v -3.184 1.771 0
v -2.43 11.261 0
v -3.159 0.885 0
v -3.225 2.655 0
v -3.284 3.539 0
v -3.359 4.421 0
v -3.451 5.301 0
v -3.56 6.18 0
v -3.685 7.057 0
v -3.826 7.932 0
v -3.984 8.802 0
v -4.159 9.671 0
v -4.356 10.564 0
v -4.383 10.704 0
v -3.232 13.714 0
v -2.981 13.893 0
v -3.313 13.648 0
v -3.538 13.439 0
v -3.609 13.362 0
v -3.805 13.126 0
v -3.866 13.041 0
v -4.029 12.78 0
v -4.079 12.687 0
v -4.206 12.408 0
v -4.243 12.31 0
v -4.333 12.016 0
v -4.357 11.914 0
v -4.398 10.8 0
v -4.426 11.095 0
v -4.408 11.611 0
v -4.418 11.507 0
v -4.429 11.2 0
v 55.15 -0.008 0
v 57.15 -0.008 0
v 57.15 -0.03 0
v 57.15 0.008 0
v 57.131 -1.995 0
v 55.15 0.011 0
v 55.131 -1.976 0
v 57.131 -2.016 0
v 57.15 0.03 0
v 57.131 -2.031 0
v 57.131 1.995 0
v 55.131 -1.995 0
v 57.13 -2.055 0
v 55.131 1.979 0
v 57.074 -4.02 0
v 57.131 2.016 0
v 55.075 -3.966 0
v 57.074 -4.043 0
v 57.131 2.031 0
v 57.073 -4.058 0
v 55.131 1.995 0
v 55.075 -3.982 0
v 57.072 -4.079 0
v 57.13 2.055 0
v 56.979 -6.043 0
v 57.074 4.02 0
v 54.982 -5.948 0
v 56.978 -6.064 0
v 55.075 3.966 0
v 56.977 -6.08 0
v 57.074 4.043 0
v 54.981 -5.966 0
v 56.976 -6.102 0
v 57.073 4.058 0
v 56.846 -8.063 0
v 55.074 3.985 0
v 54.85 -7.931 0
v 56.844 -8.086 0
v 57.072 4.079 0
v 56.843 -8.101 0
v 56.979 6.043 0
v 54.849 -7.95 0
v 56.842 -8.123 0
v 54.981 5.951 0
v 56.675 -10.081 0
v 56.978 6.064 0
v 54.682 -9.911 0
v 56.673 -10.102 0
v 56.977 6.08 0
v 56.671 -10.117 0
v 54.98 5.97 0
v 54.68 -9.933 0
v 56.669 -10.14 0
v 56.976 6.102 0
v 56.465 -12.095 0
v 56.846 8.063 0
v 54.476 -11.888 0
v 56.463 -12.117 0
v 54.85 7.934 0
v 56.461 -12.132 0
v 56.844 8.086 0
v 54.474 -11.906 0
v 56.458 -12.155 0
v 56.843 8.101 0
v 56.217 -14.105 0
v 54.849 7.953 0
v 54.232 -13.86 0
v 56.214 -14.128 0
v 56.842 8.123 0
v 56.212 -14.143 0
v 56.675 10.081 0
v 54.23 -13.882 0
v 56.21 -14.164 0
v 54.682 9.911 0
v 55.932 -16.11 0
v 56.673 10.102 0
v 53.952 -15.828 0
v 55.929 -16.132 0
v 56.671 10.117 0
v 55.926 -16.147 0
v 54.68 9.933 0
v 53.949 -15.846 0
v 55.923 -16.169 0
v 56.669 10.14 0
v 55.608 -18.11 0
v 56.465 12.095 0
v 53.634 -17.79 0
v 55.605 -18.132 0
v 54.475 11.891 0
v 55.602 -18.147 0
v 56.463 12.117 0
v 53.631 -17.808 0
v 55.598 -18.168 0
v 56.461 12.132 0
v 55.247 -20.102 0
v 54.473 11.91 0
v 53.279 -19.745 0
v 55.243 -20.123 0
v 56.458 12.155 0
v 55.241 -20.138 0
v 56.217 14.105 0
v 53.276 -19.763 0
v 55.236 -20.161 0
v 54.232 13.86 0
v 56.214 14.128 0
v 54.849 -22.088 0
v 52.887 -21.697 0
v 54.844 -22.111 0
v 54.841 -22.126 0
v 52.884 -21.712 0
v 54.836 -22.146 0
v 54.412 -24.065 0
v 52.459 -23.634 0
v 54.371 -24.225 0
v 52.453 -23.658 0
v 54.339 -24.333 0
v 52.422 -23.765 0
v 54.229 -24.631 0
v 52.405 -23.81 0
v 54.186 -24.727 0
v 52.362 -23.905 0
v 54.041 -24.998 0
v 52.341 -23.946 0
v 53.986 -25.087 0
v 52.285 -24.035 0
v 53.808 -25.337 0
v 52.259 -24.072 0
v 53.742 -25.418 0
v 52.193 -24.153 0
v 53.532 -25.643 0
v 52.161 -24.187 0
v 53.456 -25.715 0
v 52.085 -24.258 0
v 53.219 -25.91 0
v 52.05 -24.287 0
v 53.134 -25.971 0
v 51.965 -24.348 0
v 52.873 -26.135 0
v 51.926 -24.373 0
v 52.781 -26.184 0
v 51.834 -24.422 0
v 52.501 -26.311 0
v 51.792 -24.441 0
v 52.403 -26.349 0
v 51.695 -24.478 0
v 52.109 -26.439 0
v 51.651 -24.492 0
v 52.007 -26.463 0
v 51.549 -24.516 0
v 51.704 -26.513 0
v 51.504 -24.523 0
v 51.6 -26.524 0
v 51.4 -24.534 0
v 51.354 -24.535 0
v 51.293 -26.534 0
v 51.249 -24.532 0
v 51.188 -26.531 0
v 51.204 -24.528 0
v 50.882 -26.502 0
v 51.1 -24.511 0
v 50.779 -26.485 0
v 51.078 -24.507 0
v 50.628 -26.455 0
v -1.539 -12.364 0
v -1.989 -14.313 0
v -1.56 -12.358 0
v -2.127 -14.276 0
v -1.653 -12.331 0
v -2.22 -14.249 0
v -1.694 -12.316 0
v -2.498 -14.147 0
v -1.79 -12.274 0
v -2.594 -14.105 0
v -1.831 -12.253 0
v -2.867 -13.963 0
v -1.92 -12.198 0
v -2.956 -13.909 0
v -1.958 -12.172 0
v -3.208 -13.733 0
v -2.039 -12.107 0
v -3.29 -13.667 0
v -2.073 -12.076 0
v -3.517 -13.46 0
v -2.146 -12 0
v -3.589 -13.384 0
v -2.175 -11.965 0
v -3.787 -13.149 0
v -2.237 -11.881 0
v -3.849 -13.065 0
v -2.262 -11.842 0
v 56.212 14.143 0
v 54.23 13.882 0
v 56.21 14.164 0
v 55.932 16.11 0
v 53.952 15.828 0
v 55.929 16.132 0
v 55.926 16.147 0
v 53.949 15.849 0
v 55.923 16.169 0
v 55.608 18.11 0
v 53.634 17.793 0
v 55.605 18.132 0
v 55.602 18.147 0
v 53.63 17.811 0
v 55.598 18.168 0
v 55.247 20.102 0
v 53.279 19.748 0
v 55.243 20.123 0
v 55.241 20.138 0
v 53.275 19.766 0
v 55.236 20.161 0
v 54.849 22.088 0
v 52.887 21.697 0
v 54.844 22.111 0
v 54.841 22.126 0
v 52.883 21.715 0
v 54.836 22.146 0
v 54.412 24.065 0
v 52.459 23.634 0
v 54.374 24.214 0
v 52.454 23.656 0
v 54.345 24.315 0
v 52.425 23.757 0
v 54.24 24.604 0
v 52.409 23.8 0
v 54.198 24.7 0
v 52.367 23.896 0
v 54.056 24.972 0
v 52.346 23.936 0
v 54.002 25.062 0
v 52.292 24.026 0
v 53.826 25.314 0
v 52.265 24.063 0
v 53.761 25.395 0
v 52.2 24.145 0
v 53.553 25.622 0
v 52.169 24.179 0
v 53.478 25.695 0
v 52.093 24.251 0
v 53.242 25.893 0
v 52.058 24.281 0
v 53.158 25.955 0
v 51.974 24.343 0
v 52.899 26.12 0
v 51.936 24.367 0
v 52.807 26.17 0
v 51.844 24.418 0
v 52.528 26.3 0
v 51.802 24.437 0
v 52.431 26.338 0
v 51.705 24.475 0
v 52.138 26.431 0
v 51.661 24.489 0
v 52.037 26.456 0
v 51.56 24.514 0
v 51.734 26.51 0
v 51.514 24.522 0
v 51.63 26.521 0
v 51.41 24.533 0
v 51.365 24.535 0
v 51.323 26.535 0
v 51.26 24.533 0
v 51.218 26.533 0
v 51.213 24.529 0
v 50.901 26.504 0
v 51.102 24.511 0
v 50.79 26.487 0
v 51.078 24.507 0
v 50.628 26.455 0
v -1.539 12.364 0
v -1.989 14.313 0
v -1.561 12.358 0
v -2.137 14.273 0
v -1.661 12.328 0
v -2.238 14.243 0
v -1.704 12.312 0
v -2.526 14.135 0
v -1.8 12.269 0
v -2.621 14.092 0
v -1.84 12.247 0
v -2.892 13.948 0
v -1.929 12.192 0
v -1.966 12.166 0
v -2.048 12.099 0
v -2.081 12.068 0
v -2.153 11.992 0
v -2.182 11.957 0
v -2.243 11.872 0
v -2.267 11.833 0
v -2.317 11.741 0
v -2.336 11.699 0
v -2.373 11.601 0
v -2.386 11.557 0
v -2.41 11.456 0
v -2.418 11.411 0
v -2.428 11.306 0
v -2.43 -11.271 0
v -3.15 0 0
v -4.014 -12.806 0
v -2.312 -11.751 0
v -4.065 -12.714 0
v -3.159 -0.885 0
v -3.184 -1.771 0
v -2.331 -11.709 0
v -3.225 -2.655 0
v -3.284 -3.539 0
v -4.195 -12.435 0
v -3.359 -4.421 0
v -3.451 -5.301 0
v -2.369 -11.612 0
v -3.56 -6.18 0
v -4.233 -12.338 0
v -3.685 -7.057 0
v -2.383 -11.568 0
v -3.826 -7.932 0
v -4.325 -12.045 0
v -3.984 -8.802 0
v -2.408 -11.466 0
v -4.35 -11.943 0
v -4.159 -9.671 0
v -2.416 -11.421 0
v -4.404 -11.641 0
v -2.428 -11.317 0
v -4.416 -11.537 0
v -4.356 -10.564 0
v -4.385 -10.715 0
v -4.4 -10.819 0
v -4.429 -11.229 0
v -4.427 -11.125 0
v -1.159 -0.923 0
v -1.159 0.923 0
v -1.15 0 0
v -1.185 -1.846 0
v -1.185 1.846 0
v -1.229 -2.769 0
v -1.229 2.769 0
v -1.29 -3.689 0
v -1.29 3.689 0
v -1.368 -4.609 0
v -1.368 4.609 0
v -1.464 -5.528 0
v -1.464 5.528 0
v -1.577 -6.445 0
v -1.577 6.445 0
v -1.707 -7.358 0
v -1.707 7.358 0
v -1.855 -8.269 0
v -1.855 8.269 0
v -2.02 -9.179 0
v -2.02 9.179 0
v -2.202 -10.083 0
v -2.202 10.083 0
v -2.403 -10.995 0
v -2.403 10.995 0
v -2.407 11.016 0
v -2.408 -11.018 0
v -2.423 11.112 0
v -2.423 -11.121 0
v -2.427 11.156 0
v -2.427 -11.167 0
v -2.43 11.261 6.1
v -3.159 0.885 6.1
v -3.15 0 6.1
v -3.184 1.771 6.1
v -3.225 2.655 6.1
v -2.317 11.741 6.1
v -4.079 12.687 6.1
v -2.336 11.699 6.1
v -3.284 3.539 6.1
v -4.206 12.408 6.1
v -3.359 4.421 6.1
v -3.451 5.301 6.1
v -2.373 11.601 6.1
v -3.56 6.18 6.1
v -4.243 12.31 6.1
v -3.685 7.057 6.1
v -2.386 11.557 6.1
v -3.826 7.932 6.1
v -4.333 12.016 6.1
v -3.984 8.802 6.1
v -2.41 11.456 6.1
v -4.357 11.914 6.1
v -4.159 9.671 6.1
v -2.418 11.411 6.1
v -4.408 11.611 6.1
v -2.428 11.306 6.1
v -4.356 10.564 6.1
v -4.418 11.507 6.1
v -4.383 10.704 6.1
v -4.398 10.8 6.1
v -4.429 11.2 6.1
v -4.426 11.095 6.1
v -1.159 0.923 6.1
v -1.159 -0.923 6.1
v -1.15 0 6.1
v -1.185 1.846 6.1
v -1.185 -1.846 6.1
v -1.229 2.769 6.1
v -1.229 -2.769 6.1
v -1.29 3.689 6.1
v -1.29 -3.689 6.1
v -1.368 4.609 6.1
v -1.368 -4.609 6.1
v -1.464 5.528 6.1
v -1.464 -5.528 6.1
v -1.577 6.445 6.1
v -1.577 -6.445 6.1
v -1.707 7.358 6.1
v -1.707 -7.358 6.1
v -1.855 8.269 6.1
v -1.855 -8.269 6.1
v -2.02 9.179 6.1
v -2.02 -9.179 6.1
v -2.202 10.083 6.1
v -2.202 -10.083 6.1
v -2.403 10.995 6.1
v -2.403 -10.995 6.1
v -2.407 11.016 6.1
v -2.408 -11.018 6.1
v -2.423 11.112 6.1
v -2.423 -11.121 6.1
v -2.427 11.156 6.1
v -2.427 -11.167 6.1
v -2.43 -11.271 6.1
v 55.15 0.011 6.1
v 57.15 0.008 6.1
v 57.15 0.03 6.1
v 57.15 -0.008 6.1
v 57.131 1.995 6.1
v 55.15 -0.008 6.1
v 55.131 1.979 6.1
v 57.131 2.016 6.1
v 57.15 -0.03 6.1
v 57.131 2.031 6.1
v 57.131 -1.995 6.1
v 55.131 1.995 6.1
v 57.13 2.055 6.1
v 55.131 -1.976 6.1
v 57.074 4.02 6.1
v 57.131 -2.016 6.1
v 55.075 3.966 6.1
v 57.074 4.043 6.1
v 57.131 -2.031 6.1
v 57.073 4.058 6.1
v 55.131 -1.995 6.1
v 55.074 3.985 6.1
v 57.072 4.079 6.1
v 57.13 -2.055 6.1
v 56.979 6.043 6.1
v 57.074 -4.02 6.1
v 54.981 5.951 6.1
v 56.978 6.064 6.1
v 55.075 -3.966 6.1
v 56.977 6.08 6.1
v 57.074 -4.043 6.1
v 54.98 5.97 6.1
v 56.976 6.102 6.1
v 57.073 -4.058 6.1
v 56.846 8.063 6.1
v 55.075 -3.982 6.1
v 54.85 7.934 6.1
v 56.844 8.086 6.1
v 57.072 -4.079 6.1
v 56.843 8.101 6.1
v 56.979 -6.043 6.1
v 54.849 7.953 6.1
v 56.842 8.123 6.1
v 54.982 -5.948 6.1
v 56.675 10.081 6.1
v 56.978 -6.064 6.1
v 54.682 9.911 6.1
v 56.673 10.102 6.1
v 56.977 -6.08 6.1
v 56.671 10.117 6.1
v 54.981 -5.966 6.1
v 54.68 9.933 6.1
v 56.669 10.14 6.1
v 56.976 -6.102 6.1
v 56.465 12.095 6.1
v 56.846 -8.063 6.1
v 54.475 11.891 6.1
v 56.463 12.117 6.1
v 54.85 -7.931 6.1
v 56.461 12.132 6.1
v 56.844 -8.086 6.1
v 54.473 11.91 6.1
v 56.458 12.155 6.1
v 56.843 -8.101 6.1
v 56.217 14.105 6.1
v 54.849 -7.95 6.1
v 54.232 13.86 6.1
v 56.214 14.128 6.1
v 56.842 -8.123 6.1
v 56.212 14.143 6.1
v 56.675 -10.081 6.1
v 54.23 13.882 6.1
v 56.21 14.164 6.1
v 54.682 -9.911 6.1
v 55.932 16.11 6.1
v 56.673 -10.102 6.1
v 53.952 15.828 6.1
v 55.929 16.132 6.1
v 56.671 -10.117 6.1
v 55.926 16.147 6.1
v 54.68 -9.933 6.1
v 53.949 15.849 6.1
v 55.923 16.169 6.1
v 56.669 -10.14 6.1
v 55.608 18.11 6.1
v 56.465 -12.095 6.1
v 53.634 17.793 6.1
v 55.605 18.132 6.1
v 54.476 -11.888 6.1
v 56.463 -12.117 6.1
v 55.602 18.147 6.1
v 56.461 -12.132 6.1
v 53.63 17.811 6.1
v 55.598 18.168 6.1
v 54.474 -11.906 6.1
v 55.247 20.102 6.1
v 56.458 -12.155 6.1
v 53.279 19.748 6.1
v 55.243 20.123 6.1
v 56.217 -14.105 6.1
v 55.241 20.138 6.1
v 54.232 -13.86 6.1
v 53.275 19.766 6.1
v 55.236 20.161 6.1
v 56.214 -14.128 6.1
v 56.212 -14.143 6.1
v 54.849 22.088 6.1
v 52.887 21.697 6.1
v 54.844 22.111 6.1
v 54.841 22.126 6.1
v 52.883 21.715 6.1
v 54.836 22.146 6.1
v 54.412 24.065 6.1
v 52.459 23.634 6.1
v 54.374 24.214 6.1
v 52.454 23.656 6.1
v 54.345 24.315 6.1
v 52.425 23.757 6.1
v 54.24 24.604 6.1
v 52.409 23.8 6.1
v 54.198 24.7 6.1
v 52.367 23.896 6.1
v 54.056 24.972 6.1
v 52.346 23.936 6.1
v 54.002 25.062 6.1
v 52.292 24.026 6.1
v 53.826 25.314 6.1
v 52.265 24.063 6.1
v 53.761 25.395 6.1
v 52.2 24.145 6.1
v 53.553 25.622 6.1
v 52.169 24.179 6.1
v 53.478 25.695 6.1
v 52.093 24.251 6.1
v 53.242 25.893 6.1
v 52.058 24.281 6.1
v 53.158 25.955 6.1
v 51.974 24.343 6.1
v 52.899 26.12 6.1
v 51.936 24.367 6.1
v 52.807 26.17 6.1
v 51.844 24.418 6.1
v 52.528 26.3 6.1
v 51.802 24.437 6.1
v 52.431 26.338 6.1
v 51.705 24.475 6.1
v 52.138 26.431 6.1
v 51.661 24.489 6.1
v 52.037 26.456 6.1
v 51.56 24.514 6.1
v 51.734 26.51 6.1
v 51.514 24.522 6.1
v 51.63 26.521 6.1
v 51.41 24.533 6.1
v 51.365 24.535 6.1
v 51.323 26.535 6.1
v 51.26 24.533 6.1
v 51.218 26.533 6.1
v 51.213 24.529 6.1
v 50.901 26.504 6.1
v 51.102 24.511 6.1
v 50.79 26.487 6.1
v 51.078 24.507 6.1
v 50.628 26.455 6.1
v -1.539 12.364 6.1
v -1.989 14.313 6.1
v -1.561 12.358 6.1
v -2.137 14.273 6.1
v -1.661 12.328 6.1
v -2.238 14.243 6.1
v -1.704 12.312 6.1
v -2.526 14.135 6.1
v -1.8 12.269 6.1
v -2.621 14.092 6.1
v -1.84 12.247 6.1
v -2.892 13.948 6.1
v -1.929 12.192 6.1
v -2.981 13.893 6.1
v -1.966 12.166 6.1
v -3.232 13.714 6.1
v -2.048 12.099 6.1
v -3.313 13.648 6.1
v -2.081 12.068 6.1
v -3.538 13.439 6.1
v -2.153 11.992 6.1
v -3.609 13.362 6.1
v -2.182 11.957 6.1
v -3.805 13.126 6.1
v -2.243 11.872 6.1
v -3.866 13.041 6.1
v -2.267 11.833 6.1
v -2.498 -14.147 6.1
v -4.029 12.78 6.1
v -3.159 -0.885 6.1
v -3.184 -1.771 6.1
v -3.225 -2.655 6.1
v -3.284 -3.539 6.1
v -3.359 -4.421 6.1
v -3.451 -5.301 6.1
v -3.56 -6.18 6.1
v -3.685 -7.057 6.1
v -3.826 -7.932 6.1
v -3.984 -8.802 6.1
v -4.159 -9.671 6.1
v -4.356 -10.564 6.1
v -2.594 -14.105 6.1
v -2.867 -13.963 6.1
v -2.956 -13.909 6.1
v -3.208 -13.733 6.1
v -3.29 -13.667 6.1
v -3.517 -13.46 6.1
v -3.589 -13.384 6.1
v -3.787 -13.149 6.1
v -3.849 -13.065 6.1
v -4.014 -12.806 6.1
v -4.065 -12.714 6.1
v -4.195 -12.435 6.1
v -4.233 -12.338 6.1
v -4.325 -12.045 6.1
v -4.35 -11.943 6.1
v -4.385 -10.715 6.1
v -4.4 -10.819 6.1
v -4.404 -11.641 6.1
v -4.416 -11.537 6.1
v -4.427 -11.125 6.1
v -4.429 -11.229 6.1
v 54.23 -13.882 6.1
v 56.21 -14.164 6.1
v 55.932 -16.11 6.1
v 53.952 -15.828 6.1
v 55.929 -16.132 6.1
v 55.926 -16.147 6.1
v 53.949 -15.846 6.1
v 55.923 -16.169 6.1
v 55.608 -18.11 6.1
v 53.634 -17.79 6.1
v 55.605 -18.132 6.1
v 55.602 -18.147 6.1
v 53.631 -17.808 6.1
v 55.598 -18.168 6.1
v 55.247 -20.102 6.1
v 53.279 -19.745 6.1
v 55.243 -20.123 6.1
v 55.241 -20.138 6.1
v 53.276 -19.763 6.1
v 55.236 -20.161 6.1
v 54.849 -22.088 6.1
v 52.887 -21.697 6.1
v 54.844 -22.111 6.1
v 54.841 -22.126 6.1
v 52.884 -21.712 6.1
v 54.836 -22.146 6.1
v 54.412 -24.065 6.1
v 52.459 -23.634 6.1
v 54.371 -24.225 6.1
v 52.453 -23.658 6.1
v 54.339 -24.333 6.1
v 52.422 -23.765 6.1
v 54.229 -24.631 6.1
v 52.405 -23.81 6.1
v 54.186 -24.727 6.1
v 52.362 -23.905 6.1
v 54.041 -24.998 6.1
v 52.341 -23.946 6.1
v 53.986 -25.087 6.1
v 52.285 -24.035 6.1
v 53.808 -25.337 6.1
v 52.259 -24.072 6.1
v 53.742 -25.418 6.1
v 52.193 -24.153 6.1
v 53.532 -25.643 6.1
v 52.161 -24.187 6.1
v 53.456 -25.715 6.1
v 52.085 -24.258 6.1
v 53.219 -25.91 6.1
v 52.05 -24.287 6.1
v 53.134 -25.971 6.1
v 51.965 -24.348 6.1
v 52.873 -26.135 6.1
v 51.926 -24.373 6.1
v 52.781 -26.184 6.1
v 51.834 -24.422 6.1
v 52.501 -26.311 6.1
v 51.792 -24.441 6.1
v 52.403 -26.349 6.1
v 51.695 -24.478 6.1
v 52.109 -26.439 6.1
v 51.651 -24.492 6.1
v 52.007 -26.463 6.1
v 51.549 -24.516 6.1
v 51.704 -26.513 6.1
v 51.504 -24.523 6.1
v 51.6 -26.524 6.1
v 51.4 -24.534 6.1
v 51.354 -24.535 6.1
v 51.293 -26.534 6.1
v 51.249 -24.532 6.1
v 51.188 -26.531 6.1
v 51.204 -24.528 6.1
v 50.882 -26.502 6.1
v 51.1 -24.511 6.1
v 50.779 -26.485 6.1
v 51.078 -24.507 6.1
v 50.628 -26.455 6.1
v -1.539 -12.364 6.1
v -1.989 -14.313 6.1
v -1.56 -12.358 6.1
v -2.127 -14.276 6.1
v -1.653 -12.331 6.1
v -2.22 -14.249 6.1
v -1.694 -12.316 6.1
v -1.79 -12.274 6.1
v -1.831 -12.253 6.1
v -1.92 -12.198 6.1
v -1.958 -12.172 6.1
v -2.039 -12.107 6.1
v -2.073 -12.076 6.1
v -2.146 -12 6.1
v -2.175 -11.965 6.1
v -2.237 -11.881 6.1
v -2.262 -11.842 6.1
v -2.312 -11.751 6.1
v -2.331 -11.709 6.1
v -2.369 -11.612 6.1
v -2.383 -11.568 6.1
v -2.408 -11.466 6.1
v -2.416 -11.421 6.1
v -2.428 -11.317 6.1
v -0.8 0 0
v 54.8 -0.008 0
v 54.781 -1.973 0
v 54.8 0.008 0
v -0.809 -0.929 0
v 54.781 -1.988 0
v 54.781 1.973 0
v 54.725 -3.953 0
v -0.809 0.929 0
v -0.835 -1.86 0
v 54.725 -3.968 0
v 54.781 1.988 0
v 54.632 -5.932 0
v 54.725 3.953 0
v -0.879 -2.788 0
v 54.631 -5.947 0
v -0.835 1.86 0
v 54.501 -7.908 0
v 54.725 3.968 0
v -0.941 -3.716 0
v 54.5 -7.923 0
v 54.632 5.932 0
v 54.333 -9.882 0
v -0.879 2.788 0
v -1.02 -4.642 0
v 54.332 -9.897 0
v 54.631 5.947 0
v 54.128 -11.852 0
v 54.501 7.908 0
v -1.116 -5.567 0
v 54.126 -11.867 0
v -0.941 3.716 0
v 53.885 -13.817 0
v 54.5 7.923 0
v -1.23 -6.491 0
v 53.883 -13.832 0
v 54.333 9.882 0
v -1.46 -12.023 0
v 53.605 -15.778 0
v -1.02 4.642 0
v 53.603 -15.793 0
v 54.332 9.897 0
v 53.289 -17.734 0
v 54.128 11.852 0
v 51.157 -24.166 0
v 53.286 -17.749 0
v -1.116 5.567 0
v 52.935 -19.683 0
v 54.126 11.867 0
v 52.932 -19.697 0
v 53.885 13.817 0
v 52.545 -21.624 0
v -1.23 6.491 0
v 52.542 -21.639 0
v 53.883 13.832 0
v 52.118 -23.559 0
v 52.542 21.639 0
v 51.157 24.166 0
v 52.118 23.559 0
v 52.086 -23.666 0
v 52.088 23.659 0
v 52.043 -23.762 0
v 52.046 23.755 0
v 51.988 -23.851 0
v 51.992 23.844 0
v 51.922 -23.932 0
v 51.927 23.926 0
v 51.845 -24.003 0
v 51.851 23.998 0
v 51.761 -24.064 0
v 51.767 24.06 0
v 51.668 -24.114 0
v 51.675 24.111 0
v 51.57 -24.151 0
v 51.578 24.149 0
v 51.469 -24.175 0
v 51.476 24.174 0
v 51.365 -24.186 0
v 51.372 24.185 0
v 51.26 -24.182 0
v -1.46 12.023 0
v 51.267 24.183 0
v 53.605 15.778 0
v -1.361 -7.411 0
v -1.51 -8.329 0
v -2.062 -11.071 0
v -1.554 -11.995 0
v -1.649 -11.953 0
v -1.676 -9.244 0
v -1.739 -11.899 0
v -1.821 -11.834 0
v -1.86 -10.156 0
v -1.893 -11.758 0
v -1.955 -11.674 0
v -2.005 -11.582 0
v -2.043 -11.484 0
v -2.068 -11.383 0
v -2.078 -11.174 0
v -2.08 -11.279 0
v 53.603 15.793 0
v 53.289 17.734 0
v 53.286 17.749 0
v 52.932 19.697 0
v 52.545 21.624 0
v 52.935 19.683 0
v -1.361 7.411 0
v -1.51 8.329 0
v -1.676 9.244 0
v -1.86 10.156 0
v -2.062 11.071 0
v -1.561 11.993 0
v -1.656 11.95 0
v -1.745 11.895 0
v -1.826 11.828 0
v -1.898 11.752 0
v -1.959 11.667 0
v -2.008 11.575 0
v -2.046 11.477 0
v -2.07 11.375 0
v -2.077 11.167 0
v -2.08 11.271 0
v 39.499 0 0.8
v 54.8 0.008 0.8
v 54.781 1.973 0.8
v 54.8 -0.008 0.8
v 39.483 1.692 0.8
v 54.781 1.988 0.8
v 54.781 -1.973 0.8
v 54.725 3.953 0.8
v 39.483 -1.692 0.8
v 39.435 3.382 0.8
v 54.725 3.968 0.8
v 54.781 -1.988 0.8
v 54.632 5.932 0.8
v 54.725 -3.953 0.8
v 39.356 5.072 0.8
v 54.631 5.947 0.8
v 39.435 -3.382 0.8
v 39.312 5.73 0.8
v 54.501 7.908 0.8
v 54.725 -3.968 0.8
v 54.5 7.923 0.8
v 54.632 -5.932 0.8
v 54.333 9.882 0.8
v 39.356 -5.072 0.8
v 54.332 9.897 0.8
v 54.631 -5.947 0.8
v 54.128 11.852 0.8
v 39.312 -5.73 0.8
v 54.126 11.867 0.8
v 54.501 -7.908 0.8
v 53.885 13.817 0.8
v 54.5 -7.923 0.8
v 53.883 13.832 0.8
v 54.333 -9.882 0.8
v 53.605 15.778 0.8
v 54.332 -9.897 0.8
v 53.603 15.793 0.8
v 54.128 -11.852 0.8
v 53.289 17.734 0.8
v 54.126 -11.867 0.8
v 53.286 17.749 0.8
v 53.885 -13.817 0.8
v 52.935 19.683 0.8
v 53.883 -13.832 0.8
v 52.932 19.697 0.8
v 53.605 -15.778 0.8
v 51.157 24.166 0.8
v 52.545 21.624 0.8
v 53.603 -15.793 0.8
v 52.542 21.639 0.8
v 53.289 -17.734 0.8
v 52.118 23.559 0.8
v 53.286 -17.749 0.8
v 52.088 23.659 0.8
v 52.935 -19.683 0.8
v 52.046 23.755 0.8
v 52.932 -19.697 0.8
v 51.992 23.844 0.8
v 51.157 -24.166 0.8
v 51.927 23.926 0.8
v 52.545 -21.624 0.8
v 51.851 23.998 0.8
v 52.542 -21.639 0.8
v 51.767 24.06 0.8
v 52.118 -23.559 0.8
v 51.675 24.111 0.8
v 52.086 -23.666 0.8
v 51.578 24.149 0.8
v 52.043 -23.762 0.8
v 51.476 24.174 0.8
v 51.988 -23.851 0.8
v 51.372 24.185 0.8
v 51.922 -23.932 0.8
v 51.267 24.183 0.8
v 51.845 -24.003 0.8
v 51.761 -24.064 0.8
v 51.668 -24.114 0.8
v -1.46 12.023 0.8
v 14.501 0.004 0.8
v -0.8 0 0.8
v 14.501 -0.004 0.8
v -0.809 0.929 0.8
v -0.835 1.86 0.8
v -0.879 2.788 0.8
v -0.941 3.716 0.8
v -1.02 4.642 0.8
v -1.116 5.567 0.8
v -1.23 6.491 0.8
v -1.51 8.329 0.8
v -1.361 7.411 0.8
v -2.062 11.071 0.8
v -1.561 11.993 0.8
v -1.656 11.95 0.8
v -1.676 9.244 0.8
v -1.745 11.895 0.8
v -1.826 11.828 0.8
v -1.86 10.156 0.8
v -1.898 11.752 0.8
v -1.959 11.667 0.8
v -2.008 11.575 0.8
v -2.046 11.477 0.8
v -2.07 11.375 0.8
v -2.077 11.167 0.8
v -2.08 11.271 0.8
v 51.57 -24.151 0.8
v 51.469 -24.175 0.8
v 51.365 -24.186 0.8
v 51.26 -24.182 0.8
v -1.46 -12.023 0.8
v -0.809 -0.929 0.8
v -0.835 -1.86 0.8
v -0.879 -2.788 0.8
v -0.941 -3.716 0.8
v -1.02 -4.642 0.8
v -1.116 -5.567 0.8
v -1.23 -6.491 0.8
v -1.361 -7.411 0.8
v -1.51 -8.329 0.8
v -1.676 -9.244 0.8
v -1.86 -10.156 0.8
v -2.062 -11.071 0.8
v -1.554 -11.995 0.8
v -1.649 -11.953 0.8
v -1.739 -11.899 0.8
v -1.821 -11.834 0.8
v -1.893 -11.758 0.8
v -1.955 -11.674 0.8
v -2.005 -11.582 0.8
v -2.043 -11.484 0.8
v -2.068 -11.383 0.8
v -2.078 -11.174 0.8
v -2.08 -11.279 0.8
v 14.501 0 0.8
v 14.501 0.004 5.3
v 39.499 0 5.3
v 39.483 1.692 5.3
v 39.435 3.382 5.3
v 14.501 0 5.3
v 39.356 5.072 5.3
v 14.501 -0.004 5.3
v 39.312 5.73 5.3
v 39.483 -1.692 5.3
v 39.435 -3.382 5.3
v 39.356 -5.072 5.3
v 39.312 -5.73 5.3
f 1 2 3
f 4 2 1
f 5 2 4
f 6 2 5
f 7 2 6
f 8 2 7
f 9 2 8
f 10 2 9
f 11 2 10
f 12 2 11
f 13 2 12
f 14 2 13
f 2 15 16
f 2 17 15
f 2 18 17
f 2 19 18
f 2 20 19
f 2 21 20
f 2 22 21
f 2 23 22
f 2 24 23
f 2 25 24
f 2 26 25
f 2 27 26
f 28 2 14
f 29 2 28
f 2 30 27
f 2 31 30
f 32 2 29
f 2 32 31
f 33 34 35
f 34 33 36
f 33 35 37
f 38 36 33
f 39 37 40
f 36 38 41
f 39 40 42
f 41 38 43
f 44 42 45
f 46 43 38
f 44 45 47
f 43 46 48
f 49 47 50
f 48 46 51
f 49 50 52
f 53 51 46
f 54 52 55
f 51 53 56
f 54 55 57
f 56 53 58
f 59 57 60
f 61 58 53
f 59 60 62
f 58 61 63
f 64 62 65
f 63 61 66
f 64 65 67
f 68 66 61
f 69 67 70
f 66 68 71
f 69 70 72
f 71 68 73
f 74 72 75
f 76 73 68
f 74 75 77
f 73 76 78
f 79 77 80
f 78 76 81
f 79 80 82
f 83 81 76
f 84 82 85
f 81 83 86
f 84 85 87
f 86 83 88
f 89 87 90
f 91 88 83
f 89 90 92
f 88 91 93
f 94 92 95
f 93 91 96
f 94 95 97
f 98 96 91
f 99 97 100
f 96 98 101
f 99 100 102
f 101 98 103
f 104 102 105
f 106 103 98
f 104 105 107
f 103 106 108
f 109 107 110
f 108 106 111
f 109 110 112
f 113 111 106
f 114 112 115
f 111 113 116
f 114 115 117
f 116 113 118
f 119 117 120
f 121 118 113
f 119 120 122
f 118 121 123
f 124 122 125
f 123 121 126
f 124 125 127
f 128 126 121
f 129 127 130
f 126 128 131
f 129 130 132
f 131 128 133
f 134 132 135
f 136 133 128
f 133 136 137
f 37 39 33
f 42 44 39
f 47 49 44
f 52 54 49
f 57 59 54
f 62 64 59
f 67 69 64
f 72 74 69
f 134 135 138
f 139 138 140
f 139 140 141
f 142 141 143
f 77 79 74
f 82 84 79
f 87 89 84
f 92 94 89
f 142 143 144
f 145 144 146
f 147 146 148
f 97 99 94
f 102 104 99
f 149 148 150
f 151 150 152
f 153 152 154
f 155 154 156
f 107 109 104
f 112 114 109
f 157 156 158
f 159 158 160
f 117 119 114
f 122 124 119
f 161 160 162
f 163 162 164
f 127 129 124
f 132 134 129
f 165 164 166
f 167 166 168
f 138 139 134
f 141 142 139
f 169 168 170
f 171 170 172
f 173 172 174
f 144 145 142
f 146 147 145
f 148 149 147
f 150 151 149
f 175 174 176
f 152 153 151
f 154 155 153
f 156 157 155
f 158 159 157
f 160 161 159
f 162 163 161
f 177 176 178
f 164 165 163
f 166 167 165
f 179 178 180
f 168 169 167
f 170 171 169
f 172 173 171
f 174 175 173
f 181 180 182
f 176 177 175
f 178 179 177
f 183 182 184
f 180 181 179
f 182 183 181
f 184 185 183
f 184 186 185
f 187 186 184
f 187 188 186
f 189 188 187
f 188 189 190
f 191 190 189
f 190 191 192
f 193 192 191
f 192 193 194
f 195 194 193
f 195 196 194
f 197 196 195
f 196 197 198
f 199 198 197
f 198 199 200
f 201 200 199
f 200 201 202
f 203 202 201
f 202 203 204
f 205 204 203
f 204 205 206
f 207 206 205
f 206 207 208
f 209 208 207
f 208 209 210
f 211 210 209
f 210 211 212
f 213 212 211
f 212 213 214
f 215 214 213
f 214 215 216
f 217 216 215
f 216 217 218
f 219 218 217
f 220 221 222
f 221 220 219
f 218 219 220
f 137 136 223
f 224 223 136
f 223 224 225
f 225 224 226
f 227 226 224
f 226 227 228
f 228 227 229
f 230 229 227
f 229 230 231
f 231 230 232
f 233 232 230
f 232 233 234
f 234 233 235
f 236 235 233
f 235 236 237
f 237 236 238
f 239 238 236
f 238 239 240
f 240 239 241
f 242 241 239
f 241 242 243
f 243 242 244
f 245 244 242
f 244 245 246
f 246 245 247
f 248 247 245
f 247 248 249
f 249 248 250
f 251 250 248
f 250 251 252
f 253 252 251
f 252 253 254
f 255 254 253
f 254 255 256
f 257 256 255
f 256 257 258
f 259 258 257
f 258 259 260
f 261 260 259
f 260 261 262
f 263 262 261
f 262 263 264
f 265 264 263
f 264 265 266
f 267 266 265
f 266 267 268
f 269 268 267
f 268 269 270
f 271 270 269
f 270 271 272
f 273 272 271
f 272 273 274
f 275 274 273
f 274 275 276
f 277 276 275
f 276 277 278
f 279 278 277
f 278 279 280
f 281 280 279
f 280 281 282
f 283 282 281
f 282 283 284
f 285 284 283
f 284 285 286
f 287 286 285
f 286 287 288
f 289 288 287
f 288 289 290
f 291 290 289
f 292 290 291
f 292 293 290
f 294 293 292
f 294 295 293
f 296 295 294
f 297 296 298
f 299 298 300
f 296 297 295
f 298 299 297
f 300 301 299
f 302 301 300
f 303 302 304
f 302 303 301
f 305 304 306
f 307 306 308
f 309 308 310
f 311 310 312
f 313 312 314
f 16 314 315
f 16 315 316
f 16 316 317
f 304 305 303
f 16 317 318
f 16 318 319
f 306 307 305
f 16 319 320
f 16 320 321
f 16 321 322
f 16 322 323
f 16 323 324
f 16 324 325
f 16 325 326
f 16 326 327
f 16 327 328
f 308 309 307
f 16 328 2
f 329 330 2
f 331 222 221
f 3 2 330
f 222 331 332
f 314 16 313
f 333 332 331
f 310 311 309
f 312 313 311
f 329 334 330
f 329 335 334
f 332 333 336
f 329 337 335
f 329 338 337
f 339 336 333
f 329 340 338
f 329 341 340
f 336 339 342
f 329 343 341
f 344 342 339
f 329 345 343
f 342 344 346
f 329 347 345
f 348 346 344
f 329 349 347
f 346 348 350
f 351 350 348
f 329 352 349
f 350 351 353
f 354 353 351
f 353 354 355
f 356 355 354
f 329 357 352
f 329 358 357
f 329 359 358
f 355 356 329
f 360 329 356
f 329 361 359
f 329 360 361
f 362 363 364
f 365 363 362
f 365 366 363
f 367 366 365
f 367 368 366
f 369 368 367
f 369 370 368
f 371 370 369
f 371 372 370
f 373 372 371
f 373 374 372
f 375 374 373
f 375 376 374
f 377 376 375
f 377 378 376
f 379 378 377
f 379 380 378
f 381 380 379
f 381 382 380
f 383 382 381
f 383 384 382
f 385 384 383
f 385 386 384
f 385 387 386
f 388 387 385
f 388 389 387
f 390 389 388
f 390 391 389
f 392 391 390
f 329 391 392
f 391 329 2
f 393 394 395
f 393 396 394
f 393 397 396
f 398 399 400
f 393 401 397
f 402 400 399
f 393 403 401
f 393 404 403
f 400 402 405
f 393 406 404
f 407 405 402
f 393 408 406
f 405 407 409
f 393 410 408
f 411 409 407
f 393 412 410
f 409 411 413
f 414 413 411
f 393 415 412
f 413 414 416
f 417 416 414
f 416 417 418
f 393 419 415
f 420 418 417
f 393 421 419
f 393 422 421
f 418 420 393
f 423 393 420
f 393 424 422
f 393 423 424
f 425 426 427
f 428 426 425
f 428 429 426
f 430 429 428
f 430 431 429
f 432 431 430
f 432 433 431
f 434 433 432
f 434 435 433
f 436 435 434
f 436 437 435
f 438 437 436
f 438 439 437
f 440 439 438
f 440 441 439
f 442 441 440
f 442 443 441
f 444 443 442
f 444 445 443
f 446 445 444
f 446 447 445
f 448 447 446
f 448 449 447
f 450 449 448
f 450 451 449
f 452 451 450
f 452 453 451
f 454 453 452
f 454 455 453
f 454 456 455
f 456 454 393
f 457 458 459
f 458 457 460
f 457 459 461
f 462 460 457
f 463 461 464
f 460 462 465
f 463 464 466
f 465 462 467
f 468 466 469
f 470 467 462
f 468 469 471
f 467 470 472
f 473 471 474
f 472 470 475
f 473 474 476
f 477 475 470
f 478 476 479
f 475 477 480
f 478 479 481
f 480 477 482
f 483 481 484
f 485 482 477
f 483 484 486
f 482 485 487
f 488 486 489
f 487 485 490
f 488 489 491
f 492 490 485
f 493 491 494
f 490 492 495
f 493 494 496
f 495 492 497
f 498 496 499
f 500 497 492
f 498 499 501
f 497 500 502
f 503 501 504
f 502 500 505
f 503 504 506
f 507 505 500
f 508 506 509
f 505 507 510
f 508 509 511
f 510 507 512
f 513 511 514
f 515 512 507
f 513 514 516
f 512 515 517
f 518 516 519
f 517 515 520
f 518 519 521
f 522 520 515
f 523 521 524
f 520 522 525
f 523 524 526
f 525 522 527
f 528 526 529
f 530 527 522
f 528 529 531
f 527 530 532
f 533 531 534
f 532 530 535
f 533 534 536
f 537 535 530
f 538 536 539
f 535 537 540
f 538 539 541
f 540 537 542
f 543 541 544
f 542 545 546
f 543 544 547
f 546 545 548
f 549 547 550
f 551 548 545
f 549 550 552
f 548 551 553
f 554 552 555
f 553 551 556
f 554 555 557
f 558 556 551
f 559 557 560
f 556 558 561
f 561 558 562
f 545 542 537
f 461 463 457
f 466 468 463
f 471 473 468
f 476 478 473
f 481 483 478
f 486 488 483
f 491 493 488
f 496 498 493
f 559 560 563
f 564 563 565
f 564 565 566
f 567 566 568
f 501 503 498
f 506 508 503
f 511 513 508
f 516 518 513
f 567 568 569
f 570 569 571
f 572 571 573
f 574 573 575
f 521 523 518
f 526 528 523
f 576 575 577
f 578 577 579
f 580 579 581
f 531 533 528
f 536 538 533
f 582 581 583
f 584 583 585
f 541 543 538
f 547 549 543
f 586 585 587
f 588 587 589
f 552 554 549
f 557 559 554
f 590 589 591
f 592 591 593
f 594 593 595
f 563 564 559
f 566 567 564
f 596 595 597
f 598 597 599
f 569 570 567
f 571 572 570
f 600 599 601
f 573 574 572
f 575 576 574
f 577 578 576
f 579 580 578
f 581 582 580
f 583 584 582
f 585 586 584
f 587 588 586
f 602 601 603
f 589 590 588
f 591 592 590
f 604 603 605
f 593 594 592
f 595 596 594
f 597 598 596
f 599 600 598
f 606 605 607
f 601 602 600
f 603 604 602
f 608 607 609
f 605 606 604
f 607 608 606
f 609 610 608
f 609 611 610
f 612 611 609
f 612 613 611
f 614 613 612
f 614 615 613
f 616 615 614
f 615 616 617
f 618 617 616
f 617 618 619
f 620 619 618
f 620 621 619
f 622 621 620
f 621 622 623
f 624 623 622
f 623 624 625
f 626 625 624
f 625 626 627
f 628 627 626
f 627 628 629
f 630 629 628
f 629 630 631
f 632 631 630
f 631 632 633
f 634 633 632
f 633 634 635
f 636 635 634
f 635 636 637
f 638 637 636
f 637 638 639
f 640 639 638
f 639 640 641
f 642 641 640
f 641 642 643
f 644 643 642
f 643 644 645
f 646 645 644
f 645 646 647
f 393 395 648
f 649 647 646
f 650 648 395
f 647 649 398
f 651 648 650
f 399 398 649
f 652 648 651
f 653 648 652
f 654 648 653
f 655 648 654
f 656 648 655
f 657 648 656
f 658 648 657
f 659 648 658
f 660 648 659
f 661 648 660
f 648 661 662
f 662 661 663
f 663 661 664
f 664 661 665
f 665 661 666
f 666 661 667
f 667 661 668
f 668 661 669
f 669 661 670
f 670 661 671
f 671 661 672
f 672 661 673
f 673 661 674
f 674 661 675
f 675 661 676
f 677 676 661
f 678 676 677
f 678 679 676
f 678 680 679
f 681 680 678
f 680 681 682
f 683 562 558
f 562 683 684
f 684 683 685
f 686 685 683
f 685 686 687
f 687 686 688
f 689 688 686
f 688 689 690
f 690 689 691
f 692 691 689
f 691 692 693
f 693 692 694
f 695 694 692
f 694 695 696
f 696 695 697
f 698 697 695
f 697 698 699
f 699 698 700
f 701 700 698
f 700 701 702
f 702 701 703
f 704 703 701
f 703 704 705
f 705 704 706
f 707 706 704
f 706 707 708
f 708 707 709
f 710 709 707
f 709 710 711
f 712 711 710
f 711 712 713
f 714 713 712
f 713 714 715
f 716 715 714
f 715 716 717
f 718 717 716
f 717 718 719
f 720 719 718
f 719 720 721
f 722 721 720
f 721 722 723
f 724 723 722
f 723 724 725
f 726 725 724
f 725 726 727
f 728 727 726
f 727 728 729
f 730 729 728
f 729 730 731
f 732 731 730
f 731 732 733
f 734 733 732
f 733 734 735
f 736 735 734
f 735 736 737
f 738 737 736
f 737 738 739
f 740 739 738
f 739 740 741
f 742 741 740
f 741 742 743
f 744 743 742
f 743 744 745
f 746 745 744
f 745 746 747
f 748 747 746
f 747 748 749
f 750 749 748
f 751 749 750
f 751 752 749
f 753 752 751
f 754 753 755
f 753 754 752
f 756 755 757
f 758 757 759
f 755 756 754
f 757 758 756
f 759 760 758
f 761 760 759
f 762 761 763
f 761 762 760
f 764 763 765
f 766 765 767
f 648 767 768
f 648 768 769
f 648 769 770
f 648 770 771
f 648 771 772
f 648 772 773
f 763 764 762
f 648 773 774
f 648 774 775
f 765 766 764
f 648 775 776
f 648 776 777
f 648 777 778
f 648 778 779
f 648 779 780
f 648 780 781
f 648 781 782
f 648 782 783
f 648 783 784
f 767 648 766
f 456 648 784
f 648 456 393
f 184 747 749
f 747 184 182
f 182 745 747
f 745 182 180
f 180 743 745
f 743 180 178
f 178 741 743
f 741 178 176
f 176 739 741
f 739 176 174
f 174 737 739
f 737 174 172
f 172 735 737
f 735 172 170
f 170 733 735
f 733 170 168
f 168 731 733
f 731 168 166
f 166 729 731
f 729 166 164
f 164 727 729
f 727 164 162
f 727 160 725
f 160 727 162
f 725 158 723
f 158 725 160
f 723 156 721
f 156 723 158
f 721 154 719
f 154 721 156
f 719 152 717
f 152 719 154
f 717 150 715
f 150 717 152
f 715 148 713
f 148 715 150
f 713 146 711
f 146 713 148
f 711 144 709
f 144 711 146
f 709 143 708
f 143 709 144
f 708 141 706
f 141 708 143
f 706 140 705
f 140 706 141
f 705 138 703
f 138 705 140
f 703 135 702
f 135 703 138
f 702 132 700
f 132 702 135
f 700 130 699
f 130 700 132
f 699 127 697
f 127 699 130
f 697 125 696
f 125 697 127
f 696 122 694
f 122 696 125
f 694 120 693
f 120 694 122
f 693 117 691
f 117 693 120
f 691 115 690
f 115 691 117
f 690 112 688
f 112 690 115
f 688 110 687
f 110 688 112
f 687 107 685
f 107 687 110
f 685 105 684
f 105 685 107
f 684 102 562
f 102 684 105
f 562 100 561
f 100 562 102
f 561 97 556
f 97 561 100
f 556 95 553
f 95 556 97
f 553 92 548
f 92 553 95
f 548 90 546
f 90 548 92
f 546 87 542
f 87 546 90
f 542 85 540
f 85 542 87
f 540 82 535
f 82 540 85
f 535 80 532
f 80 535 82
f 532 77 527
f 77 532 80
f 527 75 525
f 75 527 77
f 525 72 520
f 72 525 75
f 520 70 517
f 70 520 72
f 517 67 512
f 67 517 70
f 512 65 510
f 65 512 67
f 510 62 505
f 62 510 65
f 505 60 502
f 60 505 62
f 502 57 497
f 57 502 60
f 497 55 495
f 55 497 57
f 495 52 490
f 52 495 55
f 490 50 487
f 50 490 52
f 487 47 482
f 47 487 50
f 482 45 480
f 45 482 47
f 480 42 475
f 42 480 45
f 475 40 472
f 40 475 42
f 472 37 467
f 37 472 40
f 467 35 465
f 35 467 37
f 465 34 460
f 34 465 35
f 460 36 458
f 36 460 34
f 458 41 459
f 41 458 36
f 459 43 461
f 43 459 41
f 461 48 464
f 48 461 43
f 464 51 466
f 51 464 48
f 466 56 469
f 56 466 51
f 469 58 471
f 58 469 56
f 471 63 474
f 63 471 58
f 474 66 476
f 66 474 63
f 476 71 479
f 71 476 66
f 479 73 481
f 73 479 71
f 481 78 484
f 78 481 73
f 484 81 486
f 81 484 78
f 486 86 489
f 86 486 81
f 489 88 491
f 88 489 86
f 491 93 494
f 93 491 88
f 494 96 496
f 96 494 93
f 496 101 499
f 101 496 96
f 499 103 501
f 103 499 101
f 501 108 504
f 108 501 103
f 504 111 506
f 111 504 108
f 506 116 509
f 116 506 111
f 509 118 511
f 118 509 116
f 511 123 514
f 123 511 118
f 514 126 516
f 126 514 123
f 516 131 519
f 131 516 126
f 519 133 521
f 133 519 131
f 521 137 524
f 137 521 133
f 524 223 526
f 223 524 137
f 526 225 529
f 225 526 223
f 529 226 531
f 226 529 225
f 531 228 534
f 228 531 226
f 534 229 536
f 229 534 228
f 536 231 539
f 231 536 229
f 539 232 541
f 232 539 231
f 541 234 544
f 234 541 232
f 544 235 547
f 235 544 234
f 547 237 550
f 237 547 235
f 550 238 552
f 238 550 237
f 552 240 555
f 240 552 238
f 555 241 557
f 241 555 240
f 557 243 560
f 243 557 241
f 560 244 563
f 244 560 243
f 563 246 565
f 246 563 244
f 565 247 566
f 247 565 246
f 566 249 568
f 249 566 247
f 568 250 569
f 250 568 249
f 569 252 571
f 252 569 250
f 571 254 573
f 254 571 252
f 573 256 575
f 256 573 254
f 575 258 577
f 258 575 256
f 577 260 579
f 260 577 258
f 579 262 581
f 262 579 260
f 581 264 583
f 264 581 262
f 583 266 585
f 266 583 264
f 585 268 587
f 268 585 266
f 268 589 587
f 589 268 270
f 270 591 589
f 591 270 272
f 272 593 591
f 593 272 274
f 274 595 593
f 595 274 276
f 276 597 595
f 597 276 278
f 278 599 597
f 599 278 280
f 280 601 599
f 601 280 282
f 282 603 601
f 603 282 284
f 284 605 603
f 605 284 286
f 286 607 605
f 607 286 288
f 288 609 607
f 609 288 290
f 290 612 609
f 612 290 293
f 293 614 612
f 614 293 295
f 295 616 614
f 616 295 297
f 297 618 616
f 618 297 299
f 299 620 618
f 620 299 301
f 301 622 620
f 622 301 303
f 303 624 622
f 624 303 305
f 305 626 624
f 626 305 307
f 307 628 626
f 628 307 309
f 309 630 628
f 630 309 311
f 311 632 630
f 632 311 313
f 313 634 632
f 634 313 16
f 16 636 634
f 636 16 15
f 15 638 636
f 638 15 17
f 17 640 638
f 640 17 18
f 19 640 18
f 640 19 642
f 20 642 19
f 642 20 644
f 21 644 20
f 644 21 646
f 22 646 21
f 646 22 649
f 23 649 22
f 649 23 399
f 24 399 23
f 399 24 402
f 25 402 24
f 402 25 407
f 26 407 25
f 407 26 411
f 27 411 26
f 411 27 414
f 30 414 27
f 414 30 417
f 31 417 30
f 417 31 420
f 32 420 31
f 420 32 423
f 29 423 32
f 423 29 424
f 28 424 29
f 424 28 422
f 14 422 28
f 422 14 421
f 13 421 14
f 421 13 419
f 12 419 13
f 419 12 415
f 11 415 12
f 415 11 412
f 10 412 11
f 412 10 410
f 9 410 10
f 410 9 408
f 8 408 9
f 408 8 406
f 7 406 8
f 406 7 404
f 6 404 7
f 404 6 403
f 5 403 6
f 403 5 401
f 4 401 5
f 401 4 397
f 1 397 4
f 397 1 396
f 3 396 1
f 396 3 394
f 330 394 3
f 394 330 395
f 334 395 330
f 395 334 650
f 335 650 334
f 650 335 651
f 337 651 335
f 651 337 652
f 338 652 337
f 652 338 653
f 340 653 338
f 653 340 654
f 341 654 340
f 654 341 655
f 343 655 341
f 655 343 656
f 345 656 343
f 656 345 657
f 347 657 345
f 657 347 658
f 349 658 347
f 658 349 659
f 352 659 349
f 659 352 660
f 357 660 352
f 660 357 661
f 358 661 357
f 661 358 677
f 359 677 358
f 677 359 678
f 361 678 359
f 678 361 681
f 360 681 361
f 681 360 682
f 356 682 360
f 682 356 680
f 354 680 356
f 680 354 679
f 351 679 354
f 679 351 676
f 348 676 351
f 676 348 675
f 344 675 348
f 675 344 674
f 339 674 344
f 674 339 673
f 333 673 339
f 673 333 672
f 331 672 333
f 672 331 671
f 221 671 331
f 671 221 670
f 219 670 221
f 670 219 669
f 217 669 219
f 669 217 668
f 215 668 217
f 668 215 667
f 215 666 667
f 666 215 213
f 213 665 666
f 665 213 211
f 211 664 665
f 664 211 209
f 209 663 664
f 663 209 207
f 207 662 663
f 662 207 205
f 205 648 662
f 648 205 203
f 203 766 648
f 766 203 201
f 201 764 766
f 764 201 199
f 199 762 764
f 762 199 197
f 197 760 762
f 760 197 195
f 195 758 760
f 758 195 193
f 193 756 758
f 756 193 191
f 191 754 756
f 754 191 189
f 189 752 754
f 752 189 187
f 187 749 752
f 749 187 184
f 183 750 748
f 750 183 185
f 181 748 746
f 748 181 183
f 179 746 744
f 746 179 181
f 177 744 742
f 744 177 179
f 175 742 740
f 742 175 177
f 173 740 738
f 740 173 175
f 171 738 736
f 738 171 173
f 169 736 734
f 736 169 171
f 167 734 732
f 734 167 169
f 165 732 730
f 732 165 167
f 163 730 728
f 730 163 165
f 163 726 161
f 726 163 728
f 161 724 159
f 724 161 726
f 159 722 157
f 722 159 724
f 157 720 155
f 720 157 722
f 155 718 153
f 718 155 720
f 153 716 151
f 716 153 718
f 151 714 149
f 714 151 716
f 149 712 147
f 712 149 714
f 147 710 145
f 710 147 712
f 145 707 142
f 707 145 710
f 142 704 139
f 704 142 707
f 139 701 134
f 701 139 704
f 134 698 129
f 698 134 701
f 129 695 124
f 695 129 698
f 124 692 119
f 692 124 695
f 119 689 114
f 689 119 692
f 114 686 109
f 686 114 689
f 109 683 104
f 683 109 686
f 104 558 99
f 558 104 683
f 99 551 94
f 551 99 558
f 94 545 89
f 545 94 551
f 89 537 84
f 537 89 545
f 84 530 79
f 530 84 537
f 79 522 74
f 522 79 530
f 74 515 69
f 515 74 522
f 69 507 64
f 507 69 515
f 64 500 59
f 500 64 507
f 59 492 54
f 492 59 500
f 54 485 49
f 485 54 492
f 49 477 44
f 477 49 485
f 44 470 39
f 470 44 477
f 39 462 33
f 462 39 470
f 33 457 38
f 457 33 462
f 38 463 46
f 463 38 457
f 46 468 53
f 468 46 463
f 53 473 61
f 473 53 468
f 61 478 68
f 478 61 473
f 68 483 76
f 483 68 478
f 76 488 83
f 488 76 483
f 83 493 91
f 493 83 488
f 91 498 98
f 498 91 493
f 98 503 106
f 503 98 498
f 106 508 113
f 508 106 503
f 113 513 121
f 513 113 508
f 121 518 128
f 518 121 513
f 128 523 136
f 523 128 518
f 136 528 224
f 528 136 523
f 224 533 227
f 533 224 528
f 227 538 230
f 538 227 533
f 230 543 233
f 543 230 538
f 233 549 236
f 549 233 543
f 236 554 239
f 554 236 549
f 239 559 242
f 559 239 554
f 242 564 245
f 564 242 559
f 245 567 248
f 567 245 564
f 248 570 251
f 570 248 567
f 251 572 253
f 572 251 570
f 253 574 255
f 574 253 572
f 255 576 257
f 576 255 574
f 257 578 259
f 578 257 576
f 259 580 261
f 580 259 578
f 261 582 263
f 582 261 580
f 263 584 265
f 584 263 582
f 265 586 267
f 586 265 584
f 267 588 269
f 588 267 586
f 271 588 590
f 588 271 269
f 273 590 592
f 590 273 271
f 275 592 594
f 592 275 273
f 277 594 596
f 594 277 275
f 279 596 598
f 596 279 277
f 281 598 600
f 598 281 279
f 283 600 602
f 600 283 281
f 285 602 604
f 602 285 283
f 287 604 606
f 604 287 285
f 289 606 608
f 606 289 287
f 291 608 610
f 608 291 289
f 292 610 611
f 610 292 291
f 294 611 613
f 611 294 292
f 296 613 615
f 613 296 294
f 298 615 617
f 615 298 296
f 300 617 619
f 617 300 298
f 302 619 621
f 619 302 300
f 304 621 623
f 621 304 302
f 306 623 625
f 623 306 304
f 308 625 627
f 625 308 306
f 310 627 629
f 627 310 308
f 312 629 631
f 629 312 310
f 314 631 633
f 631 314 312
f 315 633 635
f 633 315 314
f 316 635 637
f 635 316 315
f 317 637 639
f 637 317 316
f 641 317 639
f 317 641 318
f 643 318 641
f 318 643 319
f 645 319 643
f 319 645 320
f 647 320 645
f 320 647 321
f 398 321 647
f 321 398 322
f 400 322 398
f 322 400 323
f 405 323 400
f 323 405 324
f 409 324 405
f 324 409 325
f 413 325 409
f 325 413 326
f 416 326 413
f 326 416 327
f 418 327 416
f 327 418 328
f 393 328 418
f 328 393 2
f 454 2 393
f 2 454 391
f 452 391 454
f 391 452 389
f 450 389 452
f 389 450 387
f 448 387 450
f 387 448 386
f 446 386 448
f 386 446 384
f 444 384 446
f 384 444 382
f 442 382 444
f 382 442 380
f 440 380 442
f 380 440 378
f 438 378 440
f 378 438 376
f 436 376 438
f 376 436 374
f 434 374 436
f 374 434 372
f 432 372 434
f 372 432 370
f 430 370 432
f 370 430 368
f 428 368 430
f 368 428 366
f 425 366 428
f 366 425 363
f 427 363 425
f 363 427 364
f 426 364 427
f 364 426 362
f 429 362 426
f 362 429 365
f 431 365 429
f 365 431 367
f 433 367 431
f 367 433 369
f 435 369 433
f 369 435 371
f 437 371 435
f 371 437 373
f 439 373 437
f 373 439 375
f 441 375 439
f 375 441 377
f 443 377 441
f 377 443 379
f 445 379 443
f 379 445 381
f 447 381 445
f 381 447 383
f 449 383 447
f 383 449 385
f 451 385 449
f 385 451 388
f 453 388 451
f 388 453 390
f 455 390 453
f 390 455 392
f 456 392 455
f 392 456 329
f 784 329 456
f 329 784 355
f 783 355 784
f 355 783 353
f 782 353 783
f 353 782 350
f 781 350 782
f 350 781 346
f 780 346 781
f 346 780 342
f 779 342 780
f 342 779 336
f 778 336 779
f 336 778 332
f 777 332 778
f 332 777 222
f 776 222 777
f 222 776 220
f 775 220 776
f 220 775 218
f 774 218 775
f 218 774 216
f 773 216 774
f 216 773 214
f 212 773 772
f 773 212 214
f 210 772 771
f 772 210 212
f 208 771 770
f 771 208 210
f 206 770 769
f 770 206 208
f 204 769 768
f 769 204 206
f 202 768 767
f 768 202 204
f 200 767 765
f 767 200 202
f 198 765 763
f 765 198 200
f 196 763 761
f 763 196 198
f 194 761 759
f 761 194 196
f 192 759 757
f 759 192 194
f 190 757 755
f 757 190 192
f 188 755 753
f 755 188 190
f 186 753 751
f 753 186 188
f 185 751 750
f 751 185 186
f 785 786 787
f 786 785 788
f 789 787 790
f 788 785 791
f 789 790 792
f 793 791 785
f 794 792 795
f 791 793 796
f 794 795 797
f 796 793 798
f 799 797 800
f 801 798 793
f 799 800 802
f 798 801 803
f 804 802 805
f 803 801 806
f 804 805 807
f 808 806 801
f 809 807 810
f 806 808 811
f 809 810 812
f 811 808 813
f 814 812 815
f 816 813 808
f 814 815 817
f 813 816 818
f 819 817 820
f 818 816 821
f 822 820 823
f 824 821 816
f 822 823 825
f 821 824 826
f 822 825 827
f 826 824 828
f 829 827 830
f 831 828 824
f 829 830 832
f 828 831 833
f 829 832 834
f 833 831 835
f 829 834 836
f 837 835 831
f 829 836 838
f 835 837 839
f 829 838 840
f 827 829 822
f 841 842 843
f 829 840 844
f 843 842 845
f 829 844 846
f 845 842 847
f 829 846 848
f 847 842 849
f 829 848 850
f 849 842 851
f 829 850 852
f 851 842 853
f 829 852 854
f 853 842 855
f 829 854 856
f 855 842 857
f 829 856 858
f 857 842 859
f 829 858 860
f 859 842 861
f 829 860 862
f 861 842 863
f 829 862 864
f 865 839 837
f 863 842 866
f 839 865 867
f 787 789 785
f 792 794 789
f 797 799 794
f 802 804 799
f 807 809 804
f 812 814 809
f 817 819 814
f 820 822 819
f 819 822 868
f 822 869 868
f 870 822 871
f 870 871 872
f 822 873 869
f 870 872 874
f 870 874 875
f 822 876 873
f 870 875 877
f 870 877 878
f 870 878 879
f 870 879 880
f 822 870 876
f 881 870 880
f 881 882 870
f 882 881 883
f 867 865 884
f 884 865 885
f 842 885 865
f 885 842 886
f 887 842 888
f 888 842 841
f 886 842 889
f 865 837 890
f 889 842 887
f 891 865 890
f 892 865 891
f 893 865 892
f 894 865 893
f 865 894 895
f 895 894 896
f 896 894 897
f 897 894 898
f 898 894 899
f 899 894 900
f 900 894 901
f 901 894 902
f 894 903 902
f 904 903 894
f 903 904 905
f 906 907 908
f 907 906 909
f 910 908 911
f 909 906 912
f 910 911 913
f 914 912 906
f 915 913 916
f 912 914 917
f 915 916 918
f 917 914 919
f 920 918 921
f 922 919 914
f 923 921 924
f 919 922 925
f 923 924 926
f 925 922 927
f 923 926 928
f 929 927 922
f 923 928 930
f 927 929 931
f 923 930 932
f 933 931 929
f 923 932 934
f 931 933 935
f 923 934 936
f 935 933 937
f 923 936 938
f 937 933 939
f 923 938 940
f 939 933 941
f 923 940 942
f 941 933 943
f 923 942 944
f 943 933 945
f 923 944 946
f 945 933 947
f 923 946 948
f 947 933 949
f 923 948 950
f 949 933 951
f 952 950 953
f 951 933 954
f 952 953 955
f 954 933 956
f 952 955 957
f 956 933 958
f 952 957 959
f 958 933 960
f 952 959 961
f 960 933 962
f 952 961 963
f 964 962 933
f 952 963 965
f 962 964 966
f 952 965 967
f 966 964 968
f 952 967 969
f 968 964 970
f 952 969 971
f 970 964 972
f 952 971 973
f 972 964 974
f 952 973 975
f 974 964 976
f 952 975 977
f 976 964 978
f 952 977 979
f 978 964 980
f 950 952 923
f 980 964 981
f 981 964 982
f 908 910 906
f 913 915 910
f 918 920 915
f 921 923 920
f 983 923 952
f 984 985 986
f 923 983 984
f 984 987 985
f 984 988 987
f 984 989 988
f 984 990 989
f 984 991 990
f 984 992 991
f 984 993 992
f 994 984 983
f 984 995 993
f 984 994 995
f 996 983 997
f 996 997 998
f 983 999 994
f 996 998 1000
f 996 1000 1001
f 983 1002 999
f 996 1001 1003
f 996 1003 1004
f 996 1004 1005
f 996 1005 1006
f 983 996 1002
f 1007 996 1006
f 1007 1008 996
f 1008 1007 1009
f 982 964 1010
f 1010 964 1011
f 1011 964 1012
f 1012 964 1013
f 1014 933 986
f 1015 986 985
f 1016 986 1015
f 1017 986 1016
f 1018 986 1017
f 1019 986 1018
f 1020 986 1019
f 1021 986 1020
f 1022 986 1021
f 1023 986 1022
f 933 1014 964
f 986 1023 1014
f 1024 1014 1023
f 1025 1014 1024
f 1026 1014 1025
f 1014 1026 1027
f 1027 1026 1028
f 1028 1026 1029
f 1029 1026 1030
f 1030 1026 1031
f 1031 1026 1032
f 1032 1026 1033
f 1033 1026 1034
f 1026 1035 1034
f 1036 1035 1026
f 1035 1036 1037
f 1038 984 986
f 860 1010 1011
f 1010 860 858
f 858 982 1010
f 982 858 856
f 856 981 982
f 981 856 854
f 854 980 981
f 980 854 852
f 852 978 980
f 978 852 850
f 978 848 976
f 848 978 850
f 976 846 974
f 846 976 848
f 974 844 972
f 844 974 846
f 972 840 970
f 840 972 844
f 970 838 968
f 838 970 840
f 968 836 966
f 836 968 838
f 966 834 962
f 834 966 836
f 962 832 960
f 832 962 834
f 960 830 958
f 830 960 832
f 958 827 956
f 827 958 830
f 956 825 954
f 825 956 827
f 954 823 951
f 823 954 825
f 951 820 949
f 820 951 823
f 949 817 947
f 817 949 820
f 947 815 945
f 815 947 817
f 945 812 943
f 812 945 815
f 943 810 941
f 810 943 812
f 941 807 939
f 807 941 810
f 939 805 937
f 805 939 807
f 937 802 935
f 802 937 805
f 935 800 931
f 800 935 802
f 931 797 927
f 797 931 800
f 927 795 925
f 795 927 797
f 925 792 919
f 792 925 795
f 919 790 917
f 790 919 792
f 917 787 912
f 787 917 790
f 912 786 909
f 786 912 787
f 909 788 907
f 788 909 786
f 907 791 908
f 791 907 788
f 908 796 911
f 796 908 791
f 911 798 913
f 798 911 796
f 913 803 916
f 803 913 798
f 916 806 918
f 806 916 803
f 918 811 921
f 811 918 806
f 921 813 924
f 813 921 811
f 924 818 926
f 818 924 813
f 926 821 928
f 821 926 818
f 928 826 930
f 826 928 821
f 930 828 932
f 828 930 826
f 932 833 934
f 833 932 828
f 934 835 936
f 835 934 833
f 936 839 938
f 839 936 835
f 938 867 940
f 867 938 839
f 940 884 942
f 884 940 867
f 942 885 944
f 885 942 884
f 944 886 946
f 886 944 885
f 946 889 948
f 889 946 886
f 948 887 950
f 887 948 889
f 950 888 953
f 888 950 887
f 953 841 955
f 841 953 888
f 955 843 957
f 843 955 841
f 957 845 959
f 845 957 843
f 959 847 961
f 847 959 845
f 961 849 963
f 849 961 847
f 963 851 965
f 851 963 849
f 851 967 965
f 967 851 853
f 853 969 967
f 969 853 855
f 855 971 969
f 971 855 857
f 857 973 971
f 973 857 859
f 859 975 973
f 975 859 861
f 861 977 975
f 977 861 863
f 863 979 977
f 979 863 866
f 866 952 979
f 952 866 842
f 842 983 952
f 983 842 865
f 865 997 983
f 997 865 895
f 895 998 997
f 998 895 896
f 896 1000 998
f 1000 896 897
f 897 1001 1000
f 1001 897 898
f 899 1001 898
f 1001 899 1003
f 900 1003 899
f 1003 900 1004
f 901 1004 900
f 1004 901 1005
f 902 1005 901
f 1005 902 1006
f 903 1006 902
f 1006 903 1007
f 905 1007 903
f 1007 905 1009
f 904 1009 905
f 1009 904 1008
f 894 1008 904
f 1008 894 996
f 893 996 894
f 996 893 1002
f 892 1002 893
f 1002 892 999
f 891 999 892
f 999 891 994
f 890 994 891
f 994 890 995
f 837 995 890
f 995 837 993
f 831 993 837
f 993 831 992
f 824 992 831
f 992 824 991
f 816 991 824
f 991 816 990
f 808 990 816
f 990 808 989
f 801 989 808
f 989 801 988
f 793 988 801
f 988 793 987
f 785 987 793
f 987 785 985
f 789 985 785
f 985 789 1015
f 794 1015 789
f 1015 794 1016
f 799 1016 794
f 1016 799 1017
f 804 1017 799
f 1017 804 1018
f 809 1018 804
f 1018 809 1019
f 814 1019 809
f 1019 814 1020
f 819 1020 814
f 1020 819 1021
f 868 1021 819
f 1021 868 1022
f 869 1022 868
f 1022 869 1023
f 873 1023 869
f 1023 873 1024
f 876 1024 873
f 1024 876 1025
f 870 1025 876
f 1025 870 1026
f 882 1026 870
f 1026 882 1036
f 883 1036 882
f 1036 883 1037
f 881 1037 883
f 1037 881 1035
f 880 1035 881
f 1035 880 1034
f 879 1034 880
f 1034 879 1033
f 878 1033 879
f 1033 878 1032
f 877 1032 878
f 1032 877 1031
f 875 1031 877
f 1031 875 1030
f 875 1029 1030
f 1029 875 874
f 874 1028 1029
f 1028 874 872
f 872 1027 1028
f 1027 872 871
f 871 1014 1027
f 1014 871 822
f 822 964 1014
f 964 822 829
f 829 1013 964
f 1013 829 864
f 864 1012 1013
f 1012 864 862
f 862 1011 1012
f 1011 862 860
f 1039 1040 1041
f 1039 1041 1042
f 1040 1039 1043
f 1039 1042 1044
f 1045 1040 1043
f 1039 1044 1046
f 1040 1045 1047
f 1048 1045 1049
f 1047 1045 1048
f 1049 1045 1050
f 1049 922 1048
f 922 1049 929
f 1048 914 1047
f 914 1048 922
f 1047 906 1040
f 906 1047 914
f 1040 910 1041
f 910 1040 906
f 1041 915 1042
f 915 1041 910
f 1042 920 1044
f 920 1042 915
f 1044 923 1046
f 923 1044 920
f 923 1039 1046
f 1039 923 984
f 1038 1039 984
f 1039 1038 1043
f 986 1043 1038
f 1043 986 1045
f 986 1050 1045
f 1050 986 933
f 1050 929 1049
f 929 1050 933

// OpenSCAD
// Gen-CJ — fit coupon (bay part): O20/O5 THROUGH pockets at carrier thickness (test on a steel offcut), 608 seat,
// D-flat bore, gap shim, and one bobbin-bay slice (bobbin footprint + bay_clear) to test former fit.
include <parameters.scad>;
$fn = 48;
// D-flat keyed bore: flat faces +X (angle 0 = magnet pocket 0 = index notch)
module dflat_bore(h) {
    intersection() {
        cylinder(d=shaft_bore, h=h);
        translate([-shaft_bore, -shaft_bore, 0]) cube([shaft_bore + dflat_x, 2*shaft_bore, h]);
    }
}
module sector_2d(r_in, r_out, ang) {
    polygon([
        for (a = [-ang/2 : ang/24 : ang/2]) [r_in*cos(a), r_in*sin(a)],
        for (a = [ang/2 : -ang/24 : -ang/2]) [r_out*cos(a), r_out*sin(a)]
    ]);
}
module footprint_2d() { offset(r=wall) sector_2d(coil_id_r, coil_od_r, span_deg); }
module hub_2d()       { offset(delta=-coil_core_inset) sector_2d(coil_id_r, coil_od_r, span_deg); }

// bay slice at FULL stator thickness with one bobbin BASE printed IN PLACE inside it (bay_clear gap): this is the
// print-in-place test for the one-plate stator. After printing, the base must pop out with finger pressure; if it is fused,
// print coil_former.stl separately (print-packs/parts/) instead of using the in-place bases.
translate([-coil_id_r, 0, 0]) {
    difference() {
        linear_extrude(stator_thick) offset(r=bay_clear + 2) footprint_2d();
        translate([0, 0, -0.1]) linear_extrude(stator_thick + 0.2) offset(r=bay_clear) footprint_2d();
    }
    union() {
        linear_extrude(flange_t) footprint_2d();
        translate([0, 0, flange_t - 0.01]) linear_extrude(former_web + 0.01) hub_2d();
    }
}
